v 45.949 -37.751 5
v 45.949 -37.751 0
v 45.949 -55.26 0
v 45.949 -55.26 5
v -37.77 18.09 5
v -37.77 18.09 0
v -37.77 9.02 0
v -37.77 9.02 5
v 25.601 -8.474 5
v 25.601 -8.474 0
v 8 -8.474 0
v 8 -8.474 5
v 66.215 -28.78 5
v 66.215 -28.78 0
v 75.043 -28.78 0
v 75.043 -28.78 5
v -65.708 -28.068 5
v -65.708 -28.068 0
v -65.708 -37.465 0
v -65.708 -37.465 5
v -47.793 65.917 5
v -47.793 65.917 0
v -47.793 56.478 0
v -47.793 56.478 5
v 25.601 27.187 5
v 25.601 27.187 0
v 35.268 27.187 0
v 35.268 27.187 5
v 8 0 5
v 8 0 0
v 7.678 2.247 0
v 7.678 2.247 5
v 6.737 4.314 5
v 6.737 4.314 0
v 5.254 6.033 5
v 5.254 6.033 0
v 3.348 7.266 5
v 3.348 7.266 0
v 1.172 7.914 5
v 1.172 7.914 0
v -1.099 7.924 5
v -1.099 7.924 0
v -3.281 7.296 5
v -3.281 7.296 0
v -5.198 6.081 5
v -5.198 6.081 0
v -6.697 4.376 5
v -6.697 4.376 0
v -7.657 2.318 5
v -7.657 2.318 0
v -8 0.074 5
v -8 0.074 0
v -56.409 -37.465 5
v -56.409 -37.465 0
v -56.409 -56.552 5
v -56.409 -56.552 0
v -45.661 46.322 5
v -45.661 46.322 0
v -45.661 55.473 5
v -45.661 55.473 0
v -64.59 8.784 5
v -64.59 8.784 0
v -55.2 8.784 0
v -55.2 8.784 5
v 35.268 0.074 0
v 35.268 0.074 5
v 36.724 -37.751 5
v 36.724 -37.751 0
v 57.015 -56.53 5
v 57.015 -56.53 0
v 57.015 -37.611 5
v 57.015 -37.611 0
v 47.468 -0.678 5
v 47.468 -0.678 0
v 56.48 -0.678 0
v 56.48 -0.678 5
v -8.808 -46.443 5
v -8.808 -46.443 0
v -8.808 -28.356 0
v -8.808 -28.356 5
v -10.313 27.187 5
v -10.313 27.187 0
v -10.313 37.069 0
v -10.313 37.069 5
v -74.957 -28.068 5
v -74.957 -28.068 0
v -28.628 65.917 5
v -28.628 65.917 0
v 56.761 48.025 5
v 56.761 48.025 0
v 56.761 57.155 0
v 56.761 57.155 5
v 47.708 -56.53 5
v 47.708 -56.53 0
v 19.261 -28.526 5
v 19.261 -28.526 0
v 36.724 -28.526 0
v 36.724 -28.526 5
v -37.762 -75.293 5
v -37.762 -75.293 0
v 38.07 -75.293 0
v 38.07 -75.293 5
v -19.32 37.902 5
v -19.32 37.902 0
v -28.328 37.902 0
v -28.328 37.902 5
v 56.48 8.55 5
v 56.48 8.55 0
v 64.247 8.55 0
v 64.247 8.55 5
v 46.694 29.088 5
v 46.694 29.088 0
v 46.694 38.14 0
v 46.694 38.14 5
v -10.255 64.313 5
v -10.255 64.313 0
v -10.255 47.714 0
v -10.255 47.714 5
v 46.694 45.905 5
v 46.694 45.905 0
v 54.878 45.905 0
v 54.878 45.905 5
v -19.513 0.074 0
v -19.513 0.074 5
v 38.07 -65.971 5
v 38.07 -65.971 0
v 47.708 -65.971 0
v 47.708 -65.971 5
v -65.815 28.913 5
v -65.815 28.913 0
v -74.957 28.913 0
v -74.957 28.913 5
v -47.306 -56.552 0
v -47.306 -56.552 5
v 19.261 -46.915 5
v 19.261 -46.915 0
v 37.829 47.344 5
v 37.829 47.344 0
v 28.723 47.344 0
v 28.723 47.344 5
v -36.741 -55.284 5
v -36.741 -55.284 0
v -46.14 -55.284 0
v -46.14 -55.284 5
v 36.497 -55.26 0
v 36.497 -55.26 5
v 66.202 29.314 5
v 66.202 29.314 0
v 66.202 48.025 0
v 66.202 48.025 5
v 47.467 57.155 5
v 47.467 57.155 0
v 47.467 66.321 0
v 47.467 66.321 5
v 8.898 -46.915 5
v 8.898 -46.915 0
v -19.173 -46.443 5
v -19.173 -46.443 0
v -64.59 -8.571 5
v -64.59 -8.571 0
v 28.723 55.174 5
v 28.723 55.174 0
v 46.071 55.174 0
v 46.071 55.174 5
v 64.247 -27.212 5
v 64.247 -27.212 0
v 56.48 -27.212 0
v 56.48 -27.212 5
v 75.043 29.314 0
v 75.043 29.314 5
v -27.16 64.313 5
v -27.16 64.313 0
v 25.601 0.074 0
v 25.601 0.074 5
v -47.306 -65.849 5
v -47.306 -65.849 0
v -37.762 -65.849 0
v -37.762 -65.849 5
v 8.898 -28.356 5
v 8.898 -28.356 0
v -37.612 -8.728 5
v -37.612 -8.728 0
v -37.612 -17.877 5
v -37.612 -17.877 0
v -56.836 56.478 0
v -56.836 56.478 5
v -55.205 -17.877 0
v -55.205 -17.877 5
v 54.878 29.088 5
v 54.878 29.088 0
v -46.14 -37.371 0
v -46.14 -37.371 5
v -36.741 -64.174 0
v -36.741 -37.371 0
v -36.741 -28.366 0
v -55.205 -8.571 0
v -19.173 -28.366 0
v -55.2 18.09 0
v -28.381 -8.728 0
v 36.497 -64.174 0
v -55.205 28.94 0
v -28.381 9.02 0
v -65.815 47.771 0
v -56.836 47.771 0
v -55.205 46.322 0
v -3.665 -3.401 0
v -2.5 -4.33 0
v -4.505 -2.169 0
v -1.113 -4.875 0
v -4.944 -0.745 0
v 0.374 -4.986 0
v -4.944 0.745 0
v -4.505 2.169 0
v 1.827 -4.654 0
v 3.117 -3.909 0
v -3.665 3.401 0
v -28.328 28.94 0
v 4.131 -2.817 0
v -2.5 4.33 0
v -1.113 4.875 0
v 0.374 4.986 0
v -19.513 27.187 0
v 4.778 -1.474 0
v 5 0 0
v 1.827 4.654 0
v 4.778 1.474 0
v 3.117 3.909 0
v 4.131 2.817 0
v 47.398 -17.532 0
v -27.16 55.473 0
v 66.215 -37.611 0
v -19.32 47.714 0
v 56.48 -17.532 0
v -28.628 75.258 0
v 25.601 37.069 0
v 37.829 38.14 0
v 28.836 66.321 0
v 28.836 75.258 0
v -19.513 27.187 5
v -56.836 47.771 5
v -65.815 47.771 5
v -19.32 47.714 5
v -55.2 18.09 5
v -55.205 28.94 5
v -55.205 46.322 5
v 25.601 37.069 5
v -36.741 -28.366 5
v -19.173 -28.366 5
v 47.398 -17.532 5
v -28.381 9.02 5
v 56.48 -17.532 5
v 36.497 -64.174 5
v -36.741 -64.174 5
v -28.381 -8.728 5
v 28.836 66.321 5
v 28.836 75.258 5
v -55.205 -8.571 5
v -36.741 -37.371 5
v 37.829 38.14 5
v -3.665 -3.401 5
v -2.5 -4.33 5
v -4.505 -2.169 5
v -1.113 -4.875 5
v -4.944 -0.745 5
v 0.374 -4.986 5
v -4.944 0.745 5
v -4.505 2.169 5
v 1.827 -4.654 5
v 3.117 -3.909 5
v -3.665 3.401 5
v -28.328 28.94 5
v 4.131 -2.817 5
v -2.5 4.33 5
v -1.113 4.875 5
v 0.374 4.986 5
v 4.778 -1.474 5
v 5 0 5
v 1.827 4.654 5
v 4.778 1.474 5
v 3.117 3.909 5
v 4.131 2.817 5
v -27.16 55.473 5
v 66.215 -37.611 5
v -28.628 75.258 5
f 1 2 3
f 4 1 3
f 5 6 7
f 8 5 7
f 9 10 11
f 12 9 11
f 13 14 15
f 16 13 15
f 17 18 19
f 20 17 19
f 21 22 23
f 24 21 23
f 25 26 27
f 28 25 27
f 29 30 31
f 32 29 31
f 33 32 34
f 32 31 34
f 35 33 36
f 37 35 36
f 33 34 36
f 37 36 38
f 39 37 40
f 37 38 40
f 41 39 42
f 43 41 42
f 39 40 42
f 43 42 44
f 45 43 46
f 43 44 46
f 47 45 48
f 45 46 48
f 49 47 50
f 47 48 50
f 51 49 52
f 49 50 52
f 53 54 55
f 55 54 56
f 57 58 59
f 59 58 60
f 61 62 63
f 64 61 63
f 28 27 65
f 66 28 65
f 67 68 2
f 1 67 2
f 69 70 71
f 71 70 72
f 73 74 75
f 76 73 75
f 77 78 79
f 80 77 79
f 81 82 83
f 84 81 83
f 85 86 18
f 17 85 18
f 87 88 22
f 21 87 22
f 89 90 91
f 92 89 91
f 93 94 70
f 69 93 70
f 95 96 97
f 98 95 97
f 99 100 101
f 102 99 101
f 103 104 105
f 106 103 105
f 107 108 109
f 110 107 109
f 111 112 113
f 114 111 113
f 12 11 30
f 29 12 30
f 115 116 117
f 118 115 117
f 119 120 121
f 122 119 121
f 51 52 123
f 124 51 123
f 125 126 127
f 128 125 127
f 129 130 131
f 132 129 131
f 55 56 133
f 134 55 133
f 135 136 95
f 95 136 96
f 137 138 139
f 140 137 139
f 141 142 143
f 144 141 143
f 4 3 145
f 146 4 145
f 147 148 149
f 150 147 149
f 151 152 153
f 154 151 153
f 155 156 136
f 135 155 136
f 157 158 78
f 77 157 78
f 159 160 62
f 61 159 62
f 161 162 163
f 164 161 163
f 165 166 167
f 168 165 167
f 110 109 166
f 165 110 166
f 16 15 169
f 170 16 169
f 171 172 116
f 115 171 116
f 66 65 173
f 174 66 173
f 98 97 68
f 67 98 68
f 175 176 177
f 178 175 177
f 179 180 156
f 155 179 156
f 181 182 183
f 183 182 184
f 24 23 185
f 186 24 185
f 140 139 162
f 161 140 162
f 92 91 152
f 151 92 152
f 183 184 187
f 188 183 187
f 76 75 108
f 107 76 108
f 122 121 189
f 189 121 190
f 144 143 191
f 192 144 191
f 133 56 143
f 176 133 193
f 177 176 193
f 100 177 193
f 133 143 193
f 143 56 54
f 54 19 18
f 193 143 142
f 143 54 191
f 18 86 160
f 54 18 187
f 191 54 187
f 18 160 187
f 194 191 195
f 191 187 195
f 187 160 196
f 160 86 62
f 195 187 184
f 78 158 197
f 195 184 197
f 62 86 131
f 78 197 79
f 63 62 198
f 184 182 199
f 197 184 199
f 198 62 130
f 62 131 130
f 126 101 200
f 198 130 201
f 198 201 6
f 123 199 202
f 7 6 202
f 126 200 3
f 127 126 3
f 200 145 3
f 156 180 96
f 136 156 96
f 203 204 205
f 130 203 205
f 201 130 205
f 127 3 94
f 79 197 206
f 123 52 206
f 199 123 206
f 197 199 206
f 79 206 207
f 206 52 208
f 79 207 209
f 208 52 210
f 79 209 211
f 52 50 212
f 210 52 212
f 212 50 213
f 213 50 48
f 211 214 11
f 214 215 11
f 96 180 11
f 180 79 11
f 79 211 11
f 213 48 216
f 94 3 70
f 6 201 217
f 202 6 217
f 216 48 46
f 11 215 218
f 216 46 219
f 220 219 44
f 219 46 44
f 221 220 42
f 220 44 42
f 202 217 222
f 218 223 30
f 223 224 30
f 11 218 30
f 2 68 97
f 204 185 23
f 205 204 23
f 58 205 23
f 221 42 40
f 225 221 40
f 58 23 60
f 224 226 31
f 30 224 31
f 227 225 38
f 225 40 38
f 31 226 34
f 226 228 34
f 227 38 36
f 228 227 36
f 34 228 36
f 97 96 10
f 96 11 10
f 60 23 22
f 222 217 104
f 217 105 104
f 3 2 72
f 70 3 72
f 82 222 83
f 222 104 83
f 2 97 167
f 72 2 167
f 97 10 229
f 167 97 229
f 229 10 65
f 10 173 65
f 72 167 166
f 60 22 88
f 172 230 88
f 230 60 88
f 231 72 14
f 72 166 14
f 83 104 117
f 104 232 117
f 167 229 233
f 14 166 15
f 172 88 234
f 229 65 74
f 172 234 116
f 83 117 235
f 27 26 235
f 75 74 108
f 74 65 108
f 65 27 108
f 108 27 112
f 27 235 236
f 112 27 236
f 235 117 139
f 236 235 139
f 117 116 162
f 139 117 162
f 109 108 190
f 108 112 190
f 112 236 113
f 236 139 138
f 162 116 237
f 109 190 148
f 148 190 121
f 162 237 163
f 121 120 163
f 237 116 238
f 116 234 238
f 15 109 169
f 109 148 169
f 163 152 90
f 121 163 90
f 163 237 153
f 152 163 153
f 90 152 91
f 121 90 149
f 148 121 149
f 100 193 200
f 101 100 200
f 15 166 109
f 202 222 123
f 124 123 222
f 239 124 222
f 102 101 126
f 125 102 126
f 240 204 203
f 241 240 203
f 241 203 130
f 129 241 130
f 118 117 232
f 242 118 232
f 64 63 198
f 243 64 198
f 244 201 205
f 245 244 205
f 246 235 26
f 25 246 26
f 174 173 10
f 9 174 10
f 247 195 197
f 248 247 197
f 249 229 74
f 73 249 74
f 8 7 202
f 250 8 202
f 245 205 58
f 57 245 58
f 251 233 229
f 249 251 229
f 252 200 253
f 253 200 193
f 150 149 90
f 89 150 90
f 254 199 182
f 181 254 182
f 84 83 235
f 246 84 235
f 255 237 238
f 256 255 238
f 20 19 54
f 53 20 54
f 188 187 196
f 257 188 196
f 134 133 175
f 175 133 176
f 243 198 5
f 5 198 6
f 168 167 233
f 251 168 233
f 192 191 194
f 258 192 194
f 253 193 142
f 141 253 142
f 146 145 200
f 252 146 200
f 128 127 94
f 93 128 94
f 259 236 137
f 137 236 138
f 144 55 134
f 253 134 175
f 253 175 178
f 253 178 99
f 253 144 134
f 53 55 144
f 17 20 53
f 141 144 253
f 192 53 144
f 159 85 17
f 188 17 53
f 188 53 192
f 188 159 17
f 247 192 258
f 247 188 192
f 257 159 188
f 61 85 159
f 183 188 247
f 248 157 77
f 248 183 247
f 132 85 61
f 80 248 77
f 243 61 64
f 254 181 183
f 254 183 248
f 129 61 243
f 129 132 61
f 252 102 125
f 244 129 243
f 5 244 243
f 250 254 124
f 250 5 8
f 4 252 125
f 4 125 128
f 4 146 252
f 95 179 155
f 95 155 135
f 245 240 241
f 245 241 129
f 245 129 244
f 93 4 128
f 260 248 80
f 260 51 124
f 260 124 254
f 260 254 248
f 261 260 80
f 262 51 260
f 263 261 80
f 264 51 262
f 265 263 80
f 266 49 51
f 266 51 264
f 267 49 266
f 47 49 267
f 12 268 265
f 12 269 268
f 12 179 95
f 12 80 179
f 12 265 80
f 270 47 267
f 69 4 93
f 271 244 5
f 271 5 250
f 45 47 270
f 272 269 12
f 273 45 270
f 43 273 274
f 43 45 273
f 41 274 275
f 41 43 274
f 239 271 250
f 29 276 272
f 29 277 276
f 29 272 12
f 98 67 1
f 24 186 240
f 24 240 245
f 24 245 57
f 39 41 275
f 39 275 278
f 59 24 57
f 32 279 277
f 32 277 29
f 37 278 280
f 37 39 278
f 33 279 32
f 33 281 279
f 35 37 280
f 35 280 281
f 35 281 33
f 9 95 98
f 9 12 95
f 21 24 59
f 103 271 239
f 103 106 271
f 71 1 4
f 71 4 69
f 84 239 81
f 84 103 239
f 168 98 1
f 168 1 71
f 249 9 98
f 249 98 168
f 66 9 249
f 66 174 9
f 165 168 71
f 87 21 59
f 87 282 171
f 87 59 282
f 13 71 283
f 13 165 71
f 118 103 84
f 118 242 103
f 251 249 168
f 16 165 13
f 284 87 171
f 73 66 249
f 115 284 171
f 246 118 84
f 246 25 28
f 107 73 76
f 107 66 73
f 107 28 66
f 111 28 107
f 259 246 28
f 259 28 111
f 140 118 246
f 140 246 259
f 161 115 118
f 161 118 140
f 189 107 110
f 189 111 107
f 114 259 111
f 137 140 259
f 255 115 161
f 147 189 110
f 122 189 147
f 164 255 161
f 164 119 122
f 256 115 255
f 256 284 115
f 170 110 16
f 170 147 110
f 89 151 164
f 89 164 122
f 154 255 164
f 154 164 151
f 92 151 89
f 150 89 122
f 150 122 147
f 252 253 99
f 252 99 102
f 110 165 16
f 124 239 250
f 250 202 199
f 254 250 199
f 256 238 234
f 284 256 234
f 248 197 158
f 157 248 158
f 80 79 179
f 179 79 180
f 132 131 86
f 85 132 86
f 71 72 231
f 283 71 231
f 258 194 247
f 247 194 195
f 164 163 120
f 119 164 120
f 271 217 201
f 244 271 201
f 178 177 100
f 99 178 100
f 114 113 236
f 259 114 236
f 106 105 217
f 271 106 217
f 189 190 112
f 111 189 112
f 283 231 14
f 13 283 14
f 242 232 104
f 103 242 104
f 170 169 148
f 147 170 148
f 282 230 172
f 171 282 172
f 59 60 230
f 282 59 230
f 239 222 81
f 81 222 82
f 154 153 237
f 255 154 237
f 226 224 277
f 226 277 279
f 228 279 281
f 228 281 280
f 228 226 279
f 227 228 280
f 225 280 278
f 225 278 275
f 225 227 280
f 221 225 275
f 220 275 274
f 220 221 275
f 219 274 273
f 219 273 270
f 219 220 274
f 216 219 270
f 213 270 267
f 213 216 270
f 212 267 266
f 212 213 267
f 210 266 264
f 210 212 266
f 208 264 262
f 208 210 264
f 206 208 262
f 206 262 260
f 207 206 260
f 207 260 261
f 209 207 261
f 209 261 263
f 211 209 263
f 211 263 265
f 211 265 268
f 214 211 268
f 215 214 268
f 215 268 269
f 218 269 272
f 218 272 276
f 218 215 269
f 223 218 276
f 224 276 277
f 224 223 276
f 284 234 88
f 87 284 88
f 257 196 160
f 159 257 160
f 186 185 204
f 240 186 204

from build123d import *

# Parameters (mm, degrees)
F0_R     = 5
F1_DEPTH = 5


# Not quite as in the source:
# - a feature names something its author has since deleted; it is built from what else it names


with BuildPart() as f1:
    # F0 (on Top) → F1 (new body)
    with BuildSketch(Plane.XY):
        Polygon((28.8361990176, 66.3212267974), (28.8361990176, 75.2581738144), (-28.6278320871, 75.2581738144), (-28.6278320871, 65.9171296439), (-47.7930275365, 65.9171296439), (-47.7930275365, 56.4777807232), (-56.8360119664, 56.4777807232), (-56.8360119664, 47.77079441), (-65.8145548105, 47.77079441), (-65.8145548105, 28.9132569506), (-74.9573593959, 28.9132569506), (-74.9573593959, -28.0682670643), (-65.7083904313, -28.0682670643), (-65.7083904313, -37.4650924841), (-56.4094499535, -37.4650924841), (-56.4094499535, -56.5523879105), (-47.3062752641, -56.5523879105), (-47.3062752641, -65.8493747442), (-37.7622978478, -65.8493747442), (-37.7622978478, -75.2934746653), (38.0699873075, -75.2934746653), (38.0699873075, -65.9706481237), (47.7079034685, -65.9706481237), (47.7079034685, -56.5304698258), (57.015301546, -56.5304698258), (57.015301546, -37.6106819749), (66.2148232459, -37.6106819749), (66.2148232459, -28.7799280069), (75.0426406041, -28.7799280069), (75.0426406041, 29.3137990452), (66.2017579949, 29.3137990452), (66.2017579949, 48.0247353784), (56.7612786638, 48.0247353784), (56.7612786638, 57.1551586931), (47.4673062579, 57.1551586931), (47.4673062579, 66.3212267974), align=None)
        Polygon((19.260561918, -28.5256245699), (36.7241599718, -28.5256245699), (36.7241599718, -37.7505006385), (45.9490339925, -37.7505006385), (45.9490339925, -55.2602632616), (36.4968368924, -55.2602632616), (36.4968368924, -64.1742375536), (-36.7407058072, -64.1742375536), (-36.7407058072, -55.283678321), (-46.1398145742, -55.283678321), (-46.1398145742, -37.3711783135), (-36.7407058072, -37.3711783135), (-36.7407058072, -28.3655547674), (-19.1730977071, -28.3655547674), (-19.1730977071, -46.4431725153), (-8.8080122735, -46.4431725153), (-8.8080122735, -28.3560384318), (8.8979564246, -28.3560384318), (8.8979564246, -46.9153605143), (19.260561918, -46.9153605143), align=None, mode=Mode.SUBTRACT)
        Polygon((56.4795812045, 8.5502099078), (64.2473643763, 8.5502099078), (64.2473643763, -27.2121818547), (56.4795812045, -27.2121818547), (56.4795812045, -17.5323278765), (47.397622189, -17.5323278765), (47.4682605536, -0.6779317695), (56.4795812045, -0.6779317695), align=None, mode=Mode.SUBTRACT)
        Polygon((-37.7697237636, 9.0201110426), (-28.3814624315, 9.0201110426), (-28.3814624315, -8.7280929223), (-37.6123304944, -8.7280929223), (-37.6123304944, -17.8766478564), (-55.2046581313, -17.8766478564), (-55.2046581313, -8.5706945335), (-64.5900750067, -8.5706945335), (-64.5900750067, 8.7840165312), (-55.1995221361, 8.7840165312), (-55.1995221361, 18.0899667823), (-37.7697237636, 18.0899667823), align=None, mode=Mode.SUBTRACT)
        Polygon((-27.1597996025, 64.3126308179), (-10.2554311506, 64.3126308179), (-10.2554311506, 47.7142569757), (-19.3196951095, 47.7142569757), (-19.3196951095, 37.9019094753), (-28.3277433041, 37.9019094753), (-28.3277433041, 28.9398610834), (-55.2046581313, 28.9398610834), (-55.2046581313, 46.3220587686), (-45.6612946386, 46.3220587686), (-45.6612946386, 55.4729318632), (-27.1597996025, 55.4729318632), align=None, mode=Mode.SUBTRACT)
        Polygon((25.6005422263, 27.1866678011), (35.2676995658, 27.1866678011), (35.2676995658, 0.073810573), (25.6005422263, 0.073810573), (25.6005422263, -8.4743950561), (8, -8.4743950561), (-10.3129134285, -8.4743950561), (-10.3129134285, 0.073810573), (-19.5128518648, 0.073810573), (-19.5128518648, 27.1866678011), (-10.3129134285, 27.1866678011), (-10.3129134285, 37.0686502221), (25.6005422263, 37.0686502221), align=None, mode=Mode.SUBTRACT)
        Polygon((28.7232235059, 47.3439866557), (28.7232235059, 55.1743970225), (46.070954491, 55.1743970225), (46.6939048371, 45.9046711012), (54.8776176106, 45.9046711012), (54.8776176106, 29.0882760215), (46.6939048371, 29.0882760215), (46.6939048371, 38.1399474098), (37.8293368529, 38.1399474098), (37.8293368529, 47.3439866557), align=None, mode=Mode.SUBTRACT)
        with BuildLine():
            ThreePointArc((-7.9996594927, 0.073810573), (-0.0369056792, -7.9999148727), (8, 0))
            ThreePointArc((8, 0), (0.0369056792, 7.9999148727), (-7.9996594927, 0.073810573))
        make_face()
        Circle(F0_R, mode=Mode.SUBTRACT)
        with BuildLine():
            Line((-10.3129134285, -8.4743950561), (8, -8.4743950561))
            Line((8, -8.4743950561), (8, 0))
            ThreePointArc((8, 0), (-0.0369056792, -7.9999148727), (-7.9996594927, 0.073810573))
            Line((-7.9996594927, 0.073810573), (-10.3129134285, 0.073810573))
            Line((-10.3129134285, 0.073810573), (-10.3129134285, -8.4743950561))
        make_face()
    extrude(amount=F1_DEPTH)


solid = f1.part
